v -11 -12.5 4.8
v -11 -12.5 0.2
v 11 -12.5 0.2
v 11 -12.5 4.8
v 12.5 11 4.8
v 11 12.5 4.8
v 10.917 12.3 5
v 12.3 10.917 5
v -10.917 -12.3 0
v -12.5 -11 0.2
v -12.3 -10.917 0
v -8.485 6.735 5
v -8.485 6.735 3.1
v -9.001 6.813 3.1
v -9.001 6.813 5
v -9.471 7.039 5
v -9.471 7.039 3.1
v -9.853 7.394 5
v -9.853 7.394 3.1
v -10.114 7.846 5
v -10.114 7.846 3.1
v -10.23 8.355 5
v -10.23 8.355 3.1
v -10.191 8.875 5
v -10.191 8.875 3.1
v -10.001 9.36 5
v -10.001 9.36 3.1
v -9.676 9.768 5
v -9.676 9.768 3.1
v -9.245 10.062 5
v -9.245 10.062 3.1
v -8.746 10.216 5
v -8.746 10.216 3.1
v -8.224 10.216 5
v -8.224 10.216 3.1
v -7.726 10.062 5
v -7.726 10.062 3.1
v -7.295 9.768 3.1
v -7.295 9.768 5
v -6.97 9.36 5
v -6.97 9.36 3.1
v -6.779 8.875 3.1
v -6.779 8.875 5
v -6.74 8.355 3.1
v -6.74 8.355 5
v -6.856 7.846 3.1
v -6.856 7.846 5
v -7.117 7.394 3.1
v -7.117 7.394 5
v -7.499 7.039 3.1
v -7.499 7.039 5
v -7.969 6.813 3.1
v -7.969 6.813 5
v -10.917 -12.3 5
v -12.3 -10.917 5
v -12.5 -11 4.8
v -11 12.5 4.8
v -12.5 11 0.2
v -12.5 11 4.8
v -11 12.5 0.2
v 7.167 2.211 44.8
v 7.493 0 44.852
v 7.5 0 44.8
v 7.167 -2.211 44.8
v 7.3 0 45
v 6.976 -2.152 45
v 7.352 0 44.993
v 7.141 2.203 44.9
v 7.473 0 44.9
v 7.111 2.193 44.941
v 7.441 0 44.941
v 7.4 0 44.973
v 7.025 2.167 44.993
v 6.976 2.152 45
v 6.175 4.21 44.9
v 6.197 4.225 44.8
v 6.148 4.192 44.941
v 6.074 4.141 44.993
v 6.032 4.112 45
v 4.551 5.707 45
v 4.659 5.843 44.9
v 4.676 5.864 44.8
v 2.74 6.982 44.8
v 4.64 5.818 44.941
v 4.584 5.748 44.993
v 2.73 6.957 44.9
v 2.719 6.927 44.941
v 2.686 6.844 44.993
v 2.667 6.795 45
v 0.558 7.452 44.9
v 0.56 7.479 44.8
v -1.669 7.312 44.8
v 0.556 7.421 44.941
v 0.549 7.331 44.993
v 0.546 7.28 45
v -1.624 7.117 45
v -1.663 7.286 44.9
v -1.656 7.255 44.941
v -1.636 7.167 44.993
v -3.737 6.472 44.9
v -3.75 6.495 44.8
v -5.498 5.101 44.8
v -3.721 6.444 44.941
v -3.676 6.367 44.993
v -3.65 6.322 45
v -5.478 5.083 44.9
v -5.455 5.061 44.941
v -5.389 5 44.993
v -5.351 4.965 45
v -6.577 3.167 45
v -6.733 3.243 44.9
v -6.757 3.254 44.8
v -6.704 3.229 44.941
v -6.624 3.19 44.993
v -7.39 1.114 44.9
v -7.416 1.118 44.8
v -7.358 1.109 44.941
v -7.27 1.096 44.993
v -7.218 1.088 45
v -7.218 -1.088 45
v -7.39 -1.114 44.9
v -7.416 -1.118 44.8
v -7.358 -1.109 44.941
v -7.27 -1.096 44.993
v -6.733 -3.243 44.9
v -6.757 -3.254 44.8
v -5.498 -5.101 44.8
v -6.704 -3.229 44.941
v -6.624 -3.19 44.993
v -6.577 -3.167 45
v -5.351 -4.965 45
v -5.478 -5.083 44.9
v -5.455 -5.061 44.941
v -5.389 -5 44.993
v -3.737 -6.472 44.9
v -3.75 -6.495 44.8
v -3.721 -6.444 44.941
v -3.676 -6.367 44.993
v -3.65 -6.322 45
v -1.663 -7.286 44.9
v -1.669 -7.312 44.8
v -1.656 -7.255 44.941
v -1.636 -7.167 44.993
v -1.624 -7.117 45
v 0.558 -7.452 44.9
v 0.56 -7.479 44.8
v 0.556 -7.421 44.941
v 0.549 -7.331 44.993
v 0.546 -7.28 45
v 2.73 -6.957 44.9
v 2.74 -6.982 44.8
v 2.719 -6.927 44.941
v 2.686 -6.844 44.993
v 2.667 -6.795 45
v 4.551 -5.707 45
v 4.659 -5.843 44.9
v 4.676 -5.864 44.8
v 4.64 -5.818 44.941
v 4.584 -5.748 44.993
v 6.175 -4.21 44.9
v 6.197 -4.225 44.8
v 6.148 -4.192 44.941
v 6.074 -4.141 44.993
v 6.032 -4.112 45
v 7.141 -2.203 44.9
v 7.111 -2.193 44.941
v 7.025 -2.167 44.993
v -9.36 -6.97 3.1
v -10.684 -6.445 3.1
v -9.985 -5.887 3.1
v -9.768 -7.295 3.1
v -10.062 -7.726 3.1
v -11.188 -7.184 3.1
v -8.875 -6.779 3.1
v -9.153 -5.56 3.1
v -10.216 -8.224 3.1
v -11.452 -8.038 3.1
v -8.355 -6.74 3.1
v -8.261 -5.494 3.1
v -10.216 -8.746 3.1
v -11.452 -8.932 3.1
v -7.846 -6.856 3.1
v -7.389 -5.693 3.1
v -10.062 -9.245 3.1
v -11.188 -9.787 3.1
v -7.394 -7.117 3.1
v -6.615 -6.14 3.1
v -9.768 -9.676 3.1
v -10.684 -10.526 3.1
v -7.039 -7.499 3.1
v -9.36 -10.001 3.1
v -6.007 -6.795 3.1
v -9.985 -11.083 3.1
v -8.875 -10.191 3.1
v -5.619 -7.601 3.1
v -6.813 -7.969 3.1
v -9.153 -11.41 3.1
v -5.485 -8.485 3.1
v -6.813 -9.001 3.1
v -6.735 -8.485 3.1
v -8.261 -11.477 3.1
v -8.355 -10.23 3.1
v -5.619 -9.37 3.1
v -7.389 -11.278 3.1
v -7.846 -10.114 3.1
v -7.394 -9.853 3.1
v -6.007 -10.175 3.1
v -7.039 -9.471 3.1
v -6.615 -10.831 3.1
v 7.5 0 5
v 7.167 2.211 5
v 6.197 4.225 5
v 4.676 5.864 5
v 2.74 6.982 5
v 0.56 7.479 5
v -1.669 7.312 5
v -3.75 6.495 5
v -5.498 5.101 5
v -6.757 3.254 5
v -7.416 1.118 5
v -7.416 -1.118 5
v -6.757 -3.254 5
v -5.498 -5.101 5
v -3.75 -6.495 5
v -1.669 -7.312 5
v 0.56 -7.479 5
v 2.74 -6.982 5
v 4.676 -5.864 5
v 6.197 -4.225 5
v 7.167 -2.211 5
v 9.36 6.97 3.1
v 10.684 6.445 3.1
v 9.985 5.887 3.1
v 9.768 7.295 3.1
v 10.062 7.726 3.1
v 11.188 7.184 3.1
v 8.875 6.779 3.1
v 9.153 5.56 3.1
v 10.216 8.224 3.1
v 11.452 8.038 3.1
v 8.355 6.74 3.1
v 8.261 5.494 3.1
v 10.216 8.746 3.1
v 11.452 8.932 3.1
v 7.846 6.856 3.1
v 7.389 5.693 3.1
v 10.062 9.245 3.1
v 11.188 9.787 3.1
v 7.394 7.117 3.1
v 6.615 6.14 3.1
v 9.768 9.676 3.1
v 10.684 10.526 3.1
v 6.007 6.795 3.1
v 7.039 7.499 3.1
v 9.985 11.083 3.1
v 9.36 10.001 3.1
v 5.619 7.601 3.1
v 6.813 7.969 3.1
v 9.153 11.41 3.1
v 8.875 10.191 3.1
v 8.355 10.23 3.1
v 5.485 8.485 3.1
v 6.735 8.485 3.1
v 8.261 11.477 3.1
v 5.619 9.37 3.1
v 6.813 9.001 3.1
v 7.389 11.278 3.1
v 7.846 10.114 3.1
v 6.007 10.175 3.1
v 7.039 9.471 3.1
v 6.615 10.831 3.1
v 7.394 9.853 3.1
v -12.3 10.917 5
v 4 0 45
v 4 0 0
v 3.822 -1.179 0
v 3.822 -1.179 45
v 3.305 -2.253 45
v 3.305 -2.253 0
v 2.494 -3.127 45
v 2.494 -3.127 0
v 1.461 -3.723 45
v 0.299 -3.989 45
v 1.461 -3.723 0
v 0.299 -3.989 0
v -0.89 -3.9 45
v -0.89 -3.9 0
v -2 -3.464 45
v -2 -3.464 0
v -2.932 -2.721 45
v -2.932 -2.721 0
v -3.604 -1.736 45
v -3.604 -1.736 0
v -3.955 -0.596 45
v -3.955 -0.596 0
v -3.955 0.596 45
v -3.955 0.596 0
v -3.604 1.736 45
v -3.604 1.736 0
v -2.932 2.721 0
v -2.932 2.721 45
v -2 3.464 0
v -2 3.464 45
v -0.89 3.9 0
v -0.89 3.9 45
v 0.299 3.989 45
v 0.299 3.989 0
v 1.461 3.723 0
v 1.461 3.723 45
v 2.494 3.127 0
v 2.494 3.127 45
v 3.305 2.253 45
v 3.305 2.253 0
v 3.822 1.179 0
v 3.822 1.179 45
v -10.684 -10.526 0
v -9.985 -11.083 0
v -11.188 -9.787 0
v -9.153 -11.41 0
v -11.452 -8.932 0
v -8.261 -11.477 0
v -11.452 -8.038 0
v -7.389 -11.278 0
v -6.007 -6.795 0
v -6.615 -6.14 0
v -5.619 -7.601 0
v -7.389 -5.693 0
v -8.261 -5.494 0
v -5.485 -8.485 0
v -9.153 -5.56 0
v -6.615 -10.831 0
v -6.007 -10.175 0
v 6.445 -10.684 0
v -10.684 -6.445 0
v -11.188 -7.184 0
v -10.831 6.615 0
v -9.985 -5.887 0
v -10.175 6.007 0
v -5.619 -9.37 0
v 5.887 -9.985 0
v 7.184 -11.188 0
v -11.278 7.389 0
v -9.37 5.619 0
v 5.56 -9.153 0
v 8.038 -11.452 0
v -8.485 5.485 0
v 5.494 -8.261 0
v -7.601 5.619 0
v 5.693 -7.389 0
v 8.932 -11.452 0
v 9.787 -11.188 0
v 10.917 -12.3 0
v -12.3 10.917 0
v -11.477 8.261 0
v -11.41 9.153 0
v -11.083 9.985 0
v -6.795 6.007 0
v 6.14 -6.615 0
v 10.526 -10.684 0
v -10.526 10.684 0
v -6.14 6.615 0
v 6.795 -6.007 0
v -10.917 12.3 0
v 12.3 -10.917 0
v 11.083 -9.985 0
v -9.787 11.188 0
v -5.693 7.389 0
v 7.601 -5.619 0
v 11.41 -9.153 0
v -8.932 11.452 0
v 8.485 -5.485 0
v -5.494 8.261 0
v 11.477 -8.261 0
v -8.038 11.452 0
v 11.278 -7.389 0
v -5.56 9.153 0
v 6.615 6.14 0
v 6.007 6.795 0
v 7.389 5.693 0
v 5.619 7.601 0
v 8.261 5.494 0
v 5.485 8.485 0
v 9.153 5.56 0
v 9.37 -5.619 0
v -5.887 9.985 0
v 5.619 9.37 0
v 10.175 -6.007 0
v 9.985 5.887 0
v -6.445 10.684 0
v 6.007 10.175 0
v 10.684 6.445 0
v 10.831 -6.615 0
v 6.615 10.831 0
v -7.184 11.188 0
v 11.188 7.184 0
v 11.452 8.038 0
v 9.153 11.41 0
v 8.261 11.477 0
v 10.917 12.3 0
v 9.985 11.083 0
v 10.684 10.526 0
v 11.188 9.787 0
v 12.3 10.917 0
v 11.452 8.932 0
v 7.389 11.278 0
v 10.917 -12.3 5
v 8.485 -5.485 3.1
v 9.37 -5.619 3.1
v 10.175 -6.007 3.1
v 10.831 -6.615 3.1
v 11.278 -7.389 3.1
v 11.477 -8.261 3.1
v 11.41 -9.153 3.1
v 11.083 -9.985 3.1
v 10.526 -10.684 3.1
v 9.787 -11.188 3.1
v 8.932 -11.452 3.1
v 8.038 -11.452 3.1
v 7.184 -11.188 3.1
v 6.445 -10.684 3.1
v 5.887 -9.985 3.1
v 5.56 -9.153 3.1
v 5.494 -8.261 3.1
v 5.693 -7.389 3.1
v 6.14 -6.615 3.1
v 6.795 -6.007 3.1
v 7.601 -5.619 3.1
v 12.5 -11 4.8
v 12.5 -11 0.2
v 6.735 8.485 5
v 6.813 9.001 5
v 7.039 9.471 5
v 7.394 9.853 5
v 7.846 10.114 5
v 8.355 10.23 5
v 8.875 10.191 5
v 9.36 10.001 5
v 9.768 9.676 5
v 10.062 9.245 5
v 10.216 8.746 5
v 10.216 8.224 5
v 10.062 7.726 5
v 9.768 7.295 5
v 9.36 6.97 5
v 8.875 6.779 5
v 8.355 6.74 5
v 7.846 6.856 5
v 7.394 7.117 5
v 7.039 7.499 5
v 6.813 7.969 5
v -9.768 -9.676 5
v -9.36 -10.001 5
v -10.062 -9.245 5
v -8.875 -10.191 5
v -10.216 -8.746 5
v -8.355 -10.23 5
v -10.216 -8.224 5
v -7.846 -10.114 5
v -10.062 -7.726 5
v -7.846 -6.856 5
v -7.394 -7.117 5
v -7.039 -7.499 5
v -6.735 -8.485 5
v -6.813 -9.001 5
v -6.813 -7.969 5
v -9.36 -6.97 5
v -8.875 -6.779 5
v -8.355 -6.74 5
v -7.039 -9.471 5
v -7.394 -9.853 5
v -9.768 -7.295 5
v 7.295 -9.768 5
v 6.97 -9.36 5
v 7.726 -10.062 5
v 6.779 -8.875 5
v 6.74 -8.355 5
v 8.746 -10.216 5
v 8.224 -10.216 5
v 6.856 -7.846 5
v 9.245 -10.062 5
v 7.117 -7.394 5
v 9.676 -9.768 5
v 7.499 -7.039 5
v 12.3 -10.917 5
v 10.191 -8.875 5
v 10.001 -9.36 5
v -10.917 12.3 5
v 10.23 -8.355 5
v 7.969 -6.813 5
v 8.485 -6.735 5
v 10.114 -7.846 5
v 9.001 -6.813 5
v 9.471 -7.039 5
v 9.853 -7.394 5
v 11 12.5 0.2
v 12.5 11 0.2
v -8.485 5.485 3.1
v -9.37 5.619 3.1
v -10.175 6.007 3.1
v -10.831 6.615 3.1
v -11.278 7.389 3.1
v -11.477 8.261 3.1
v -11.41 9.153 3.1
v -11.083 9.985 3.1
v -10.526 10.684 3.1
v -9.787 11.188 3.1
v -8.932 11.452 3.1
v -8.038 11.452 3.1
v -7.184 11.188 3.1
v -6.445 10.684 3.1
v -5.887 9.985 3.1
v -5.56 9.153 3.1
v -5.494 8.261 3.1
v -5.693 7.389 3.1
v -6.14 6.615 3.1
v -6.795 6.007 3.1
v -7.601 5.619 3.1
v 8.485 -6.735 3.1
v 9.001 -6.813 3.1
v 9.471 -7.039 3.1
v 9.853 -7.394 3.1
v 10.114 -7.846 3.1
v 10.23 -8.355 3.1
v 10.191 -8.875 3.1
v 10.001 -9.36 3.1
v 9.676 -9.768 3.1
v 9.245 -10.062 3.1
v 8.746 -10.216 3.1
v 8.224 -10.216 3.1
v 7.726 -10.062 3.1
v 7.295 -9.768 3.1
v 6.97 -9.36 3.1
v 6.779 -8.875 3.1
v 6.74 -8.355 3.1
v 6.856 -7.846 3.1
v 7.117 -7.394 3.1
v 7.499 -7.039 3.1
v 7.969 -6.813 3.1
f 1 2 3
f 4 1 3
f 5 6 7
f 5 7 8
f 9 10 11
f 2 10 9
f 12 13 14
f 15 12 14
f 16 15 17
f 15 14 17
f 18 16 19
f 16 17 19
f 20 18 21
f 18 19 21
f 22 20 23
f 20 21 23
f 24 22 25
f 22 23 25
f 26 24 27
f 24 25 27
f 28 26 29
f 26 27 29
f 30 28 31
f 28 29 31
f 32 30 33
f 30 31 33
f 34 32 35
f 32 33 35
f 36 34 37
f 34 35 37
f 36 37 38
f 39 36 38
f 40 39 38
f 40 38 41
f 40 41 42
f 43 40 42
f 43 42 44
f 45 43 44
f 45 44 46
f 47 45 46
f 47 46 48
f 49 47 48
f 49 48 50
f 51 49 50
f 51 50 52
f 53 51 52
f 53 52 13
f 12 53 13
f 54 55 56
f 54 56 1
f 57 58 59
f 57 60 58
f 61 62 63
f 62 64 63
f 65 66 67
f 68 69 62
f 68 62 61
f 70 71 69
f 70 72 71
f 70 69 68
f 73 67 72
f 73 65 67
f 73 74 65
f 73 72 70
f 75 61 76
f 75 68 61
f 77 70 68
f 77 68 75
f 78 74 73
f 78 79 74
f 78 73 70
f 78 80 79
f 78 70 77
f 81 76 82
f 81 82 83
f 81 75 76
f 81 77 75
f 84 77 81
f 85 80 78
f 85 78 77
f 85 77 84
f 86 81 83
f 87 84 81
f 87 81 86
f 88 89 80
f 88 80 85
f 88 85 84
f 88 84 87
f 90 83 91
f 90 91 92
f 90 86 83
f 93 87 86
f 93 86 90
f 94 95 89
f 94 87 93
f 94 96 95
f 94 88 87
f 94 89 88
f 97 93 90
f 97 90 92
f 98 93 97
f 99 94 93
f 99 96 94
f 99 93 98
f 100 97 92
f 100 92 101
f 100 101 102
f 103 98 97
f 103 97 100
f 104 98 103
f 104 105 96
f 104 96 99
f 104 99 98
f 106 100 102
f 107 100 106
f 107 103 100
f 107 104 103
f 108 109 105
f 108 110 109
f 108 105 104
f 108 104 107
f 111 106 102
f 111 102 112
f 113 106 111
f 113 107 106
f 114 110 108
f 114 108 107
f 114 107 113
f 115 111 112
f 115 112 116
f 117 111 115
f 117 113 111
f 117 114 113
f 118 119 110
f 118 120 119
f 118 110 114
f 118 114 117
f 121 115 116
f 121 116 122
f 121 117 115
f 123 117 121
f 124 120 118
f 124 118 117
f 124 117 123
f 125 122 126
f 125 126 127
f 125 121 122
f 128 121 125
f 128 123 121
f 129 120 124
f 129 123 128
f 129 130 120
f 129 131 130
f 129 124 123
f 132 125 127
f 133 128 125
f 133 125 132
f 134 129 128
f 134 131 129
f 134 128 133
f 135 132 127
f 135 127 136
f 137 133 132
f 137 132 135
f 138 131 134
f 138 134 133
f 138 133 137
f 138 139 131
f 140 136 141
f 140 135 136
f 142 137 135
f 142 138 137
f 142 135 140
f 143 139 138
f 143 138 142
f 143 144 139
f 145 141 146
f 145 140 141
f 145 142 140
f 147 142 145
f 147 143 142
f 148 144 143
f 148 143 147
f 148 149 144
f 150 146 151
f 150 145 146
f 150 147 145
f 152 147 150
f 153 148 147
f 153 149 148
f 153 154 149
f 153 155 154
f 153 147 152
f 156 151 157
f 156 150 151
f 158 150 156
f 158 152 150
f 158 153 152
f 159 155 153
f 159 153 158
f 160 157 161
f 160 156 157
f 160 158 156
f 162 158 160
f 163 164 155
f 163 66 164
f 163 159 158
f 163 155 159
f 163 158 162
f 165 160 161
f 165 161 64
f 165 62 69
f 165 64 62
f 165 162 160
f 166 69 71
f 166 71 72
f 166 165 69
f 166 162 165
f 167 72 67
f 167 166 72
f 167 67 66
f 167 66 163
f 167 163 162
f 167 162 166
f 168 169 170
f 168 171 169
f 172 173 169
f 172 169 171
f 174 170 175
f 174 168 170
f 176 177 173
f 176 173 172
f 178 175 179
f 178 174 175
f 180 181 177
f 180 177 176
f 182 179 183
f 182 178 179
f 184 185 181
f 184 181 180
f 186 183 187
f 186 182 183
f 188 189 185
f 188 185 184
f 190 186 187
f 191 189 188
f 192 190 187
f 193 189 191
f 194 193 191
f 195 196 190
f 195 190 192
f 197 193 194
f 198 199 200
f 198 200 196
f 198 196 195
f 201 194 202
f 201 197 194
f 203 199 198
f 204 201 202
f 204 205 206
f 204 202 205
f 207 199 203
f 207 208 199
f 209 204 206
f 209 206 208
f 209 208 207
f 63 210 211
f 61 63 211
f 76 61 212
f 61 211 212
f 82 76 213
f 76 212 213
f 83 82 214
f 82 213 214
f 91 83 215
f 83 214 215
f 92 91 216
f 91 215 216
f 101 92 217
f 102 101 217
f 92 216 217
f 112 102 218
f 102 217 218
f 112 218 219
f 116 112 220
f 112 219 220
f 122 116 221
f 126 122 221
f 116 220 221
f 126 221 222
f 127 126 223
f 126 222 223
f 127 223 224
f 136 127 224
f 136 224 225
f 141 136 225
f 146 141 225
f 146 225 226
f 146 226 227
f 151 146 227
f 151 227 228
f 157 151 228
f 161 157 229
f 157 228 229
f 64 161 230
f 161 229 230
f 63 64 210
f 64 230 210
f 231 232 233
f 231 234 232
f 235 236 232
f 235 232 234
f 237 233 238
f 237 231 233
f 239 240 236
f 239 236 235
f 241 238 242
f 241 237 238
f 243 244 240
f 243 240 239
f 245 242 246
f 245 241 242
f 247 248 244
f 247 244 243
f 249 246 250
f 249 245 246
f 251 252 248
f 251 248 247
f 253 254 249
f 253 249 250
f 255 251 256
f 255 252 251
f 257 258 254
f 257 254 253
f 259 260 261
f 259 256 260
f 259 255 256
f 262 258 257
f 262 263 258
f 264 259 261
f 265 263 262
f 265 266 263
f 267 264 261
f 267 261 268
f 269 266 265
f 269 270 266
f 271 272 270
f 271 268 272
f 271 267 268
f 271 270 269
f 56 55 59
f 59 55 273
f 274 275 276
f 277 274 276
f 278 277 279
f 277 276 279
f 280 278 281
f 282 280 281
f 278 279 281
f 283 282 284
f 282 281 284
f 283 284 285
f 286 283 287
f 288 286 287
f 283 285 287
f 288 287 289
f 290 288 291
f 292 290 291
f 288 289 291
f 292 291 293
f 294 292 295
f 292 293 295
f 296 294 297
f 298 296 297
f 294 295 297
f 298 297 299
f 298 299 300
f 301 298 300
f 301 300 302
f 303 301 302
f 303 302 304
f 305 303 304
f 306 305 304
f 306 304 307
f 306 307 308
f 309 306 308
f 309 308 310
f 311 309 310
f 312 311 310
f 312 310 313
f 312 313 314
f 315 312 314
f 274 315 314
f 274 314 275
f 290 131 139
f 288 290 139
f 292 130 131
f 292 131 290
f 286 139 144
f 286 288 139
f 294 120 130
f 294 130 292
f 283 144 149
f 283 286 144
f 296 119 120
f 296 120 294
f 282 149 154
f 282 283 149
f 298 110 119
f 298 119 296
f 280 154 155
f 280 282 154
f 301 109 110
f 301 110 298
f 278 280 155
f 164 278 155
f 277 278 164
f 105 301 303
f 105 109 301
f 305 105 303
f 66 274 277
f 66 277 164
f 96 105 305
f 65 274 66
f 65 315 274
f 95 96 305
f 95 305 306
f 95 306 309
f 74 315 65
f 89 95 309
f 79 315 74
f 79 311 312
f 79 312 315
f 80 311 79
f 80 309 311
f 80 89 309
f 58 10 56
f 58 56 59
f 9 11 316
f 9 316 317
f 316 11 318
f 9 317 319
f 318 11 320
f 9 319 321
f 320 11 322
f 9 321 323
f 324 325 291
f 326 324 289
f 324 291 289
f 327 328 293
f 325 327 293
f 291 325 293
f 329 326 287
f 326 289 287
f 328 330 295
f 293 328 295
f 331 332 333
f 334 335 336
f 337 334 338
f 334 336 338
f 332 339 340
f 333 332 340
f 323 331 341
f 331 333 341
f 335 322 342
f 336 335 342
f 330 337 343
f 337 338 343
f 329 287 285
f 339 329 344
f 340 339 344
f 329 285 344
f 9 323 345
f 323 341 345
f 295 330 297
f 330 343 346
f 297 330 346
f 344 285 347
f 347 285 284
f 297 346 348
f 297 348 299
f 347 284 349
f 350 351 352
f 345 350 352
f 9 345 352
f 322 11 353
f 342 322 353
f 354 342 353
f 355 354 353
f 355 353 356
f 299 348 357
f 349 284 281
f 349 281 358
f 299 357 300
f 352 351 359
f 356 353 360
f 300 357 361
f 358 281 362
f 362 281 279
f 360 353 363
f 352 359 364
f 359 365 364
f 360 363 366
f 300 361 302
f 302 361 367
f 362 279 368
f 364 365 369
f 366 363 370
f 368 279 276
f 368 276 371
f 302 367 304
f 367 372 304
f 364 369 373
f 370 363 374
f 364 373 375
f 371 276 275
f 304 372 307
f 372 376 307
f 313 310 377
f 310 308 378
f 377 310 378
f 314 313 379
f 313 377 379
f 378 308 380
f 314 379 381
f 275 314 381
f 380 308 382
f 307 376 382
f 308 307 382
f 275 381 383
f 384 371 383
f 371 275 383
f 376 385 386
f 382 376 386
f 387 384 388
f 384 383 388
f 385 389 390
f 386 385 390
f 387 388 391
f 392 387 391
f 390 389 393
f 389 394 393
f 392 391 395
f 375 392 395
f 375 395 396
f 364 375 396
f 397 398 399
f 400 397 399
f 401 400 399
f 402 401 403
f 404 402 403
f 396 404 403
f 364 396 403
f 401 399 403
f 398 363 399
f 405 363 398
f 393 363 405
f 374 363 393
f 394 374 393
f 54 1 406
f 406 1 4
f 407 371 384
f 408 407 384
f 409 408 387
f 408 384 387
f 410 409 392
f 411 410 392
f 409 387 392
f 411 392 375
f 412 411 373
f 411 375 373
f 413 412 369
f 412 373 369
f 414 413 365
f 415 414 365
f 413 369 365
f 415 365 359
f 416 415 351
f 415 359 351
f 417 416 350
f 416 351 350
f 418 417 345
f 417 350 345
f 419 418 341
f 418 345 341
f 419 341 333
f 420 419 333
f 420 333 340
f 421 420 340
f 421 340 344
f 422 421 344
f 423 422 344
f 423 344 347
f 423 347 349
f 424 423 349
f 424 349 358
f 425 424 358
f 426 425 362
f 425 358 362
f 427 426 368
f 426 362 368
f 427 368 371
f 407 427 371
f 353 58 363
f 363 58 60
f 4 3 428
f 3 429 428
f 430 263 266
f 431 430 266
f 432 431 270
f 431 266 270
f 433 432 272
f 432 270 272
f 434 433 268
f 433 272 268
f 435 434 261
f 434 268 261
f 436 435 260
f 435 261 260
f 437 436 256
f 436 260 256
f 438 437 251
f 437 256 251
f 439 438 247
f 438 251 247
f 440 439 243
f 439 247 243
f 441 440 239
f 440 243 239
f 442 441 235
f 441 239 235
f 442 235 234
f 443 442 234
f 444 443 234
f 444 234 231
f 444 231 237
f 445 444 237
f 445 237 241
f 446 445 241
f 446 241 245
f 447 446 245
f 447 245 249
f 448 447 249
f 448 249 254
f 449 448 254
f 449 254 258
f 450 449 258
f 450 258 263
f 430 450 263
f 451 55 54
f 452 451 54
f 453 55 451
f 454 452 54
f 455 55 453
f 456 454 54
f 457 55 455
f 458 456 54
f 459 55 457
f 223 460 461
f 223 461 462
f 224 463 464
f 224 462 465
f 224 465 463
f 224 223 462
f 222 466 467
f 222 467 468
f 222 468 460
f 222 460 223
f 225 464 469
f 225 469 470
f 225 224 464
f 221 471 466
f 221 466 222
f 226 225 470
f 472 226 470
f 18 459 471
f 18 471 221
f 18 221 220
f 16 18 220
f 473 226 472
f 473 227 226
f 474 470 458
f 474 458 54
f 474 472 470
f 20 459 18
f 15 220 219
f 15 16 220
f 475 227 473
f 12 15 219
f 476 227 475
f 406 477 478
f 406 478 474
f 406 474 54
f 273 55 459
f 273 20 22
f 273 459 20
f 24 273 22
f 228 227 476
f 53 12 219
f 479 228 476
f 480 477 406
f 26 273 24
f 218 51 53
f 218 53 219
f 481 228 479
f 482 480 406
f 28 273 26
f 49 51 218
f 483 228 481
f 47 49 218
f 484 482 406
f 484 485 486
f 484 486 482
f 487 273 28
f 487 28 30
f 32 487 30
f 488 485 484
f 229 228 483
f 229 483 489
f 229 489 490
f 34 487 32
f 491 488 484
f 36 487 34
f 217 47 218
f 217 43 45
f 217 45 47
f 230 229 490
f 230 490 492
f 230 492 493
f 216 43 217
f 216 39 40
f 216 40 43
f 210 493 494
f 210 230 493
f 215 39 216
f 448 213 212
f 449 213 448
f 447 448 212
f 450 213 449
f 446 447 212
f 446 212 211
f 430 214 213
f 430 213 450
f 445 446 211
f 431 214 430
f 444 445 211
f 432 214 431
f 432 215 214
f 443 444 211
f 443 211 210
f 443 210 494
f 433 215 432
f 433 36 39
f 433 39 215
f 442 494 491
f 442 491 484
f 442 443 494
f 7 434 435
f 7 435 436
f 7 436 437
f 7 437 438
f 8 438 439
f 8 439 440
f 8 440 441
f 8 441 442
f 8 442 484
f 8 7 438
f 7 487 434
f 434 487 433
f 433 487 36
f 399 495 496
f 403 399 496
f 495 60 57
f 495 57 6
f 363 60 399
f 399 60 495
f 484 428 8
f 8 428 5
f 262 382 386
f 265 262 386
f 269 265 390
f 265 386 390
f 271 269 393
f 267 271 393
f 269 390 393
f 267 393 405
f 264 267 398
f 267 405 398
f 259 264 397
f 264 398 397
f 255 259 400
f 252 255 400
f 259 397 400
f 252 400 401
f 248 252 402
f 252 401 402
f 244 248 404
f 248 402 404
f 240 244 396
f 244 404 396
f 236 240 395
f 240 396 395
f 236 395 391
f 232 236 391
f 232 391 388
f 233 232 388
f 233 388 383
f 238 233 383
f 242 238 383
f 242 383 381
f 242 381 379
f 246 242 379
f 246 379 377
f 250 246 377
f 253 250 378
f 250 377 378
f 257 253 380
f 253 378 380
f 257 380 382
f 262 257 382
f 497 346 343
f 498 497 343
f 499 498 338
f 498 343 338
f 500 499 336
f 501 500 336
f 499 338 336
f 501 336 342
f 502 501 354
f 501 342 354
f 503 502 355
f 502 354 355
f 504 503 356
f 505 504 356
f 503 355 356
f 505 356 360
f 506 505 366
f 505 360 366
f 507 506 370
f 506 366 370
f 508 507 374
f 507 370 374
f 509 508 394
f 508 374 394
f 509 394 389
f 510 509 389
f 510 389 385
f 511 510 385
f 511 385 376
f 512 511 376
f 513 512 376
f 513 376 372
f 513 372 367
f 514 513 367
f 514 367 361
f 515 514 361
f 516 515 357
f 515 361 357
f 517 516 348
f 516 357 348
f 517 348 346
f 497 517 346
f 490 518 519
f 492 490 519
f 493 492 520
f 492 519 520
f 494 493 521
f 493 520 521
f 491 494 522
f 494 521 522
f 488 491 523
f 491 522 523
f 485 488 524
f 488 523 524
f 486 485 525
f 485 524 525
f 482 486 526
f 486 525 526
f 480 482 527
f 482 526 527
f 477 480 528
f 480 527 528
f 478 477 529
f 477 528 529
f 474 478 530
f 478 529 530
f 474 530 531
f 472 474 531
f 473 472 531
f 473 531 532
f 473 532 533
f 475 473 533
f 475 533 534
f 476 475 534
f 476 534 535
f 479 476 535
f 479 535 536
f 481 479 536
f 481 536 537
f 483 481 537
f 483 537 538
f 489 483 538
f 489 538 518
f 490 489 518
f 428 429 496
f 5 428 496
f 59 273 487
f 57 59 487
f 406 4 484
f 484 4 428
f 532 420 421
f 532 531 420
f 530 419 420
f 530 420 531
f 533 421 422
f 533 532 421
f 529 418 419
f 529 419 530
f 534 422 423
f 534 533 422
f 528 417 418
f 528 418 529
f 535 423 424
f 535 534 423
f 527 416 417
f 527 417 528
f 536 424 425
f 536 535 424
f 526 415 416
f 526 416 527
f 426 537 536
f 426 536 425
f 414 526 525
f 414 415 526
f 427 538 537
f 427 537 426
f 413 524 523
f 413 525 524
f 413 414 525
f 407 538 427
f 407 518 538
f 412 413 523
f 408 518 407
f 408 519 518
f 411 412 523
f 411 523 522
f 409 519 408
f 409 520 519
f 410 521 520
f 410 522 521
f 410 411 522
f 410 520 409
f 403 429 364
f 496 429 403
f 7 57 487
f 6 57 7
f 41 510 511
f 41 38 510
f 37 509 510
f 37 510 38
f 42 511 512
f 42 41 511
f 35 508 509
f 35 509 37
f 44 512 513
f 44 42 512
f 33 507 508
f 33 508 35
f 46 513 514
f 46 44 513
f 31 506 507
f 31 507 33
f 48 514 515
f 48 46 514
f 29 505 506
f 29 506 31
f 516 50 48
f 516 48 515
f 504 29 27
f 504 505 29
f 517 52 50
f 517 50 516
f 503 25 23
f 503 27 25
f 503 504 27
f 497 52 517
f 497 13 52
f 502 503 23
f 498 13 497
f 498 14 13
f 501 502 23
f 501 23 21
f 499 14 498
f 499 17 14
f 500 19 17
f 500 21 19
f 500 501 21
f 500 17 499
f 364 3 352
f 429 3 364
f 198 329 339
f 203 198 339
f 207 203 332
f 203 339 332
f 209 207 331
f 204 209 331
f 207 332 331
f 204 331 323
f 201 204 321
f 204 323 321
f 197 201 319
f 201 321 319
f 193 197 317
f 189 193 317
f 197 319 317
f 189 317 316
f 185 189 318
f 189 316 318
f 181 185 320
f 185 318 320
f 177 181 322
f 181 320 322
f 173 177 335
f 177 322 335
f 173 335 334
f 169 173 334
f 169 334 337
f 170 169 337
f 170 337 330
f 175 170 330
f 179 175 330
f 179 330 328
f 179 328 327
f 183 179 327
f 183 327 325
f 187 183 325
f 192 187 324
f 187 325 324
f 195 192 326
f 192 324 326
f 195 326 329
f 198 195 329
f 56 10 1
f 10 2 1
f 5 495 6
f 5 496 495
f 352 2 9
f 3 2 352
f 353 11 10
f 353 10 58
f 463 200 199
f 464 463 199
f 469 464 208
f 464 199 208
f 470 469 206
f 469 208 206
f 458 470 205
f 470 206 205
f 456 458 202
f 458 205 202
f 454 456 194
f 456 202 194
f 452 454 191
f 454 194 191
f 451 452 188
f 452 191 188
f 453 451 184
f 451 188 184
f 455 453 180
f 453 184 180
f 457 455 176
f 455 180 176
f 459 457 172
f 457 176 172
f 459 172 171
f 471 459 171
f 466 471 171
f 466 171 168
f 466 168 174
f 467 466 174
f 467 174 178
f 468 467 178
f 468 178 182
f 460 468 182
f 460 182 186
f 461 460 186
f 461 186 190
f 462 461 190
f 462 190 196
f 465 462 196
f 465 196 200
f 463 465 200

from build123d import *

# Parameters (mm, degrees)
SKETCH_W              = 25
SKETCH_H              = 25
PAD_DEPTH             = 5
SKETCH001_R           = 7.5
PAD001_DEPTH          = 40
SKETCH004_R           = 4
POCKET_DEPTH          = 45.001
SKETCH005_R           = 3
POCKET001_DEPTH       = 3.1
POLARPATTERN_COUNT    = 4
SKETCH006_R           = 1.75
POCKET002_DEPTH       = 156.356231
POLARPATTERN001_COUNT = 4
CHAMFER_SIZE          = 1.5
CHAMFER001_SIZE       = 0.2
FILLET_R              = 0.2


with BuildPart() as part:
    # Sketch → Pad (new body)
    with BuildSketch(Plane.XY):
        Rectangle(SKETCH_W, SKETCH_H)
    extrude(amount=PAD_DEPTH)

    # Sketch001 (on Face6 of Pad) → Pad001 (join)
    with BuildSketch(Plane.XY.offset(5)):
        Circle(SKETCH001_R)
    extrude(amount=PAD001_DEPTH)

    # Sketch004 (on Face4 of Pad001) → Pocket (cut, through all)
    with BuildSketch(Plane(origin=(0, 0, 0), x_dir=(1, 0, 0), z_dir=(0, 0, -1))):
        Circle(SKETCH004_R)
    extrude(amount=-POCKET_DEPTH, mode=Mode.SUBTRACT)

    # Sketch005 (on Face4 of Pocket) → Pocket001 (cut)
    with BuildSketch(Plane(origin=(0, 0, 0), x_dir=(1, 0, 0), z_dir=(0, 0, -1))):
        with Locations((-8.485281, 8.485281)):
            Circle(SKETCH005_R)
    pocket001 = extrude(amount=-POCKET001_DEPTH, mode=Mode.SUBTRACT)

    # PolarPattern: Pocket001 ×4 about axis
    polarpattern_axis = Axis((0, 0, 0), (0, 0, -1))
    for i in range(1, POLARPATTERN_COUNT):
        add(pocket001.rotate(polarpattern_axis, i * 360 / POLARPATTERN_COUNT), mode=Mode.SUBTRACT)

    # Sketch006 (on Face16 of PolarPattern) → Pocket002 (cut, through all)
    with BuildSketch(Plane(origin=(0, 0, 3.1), x_dir=(1, 0, 0), z_dir=(0, 0, -1))):
        with Locations((-8.485281, 8.485281)):
            Circle(SKETCH006_R)
    pocket002 = extrude(amount=-POCKET002_DEPTH, mode=Mode.SUBTRACT)

    # PolarPattern001: Pocket002 ×4 about axis
    polarpattern001_axis = Axis((0, 0, 3.1), (0, 0, -1))
    for i in range(1, POLARPATTERN001_COUNT):
        add(pocket002.rotate(polarpattern001_axis, i * 360 / POLARPATTERN001_COUNT), mode=Mode.SUBTRACT)

    # Chamfer
    chamfer_edges = [part.edges().sort_by_distance(p)[0] for p in [
        (-12.5, 12.5, 2.5),
        (-12.5, -12.5, 2.5),
        (12.5, -12.5, 2.5),
        (12.5, 12.5, 2.5),
    ]]
    chamfer(chamfer_edges, length=CHAMFER_SIZE)

    # Chamfer001
    chamfer001_edges = [part.edges().sort_by_distance(p)[0] for p in [
        (-11.75, 11.75, 0),
        (0, 12.5, 0),
        (11.75, 11.75, 0),
        (12.5, 0, 0),
        (11.75, -11.75, 0),
        (0, -12.5, 0),
        (-11.75, -11.75, 0),
        (-12.5, 0, 0),
        (-11.75, 11.75, 5),
        (0, 12.5, 5),
        (11.75, 11.75, 5),
        (12.5, 0, 5),
        (0, -12.5, 5),
        (-11.75, -11.75, 5),
        (-12.5, 0, 5),
        (11.75, -11.75, 5),
    ]]
    chamfer(chamfer001_edges, length=CHAMFER001_SIZE)

    # Fillet
    fillet_edges = [part.edges().sort_by_distance(p)[0] for p in [
        (-7.5, 0, 45),
    ]]
    fillet(fillet_edges, radius=FILLET_R)


solid = part.part
